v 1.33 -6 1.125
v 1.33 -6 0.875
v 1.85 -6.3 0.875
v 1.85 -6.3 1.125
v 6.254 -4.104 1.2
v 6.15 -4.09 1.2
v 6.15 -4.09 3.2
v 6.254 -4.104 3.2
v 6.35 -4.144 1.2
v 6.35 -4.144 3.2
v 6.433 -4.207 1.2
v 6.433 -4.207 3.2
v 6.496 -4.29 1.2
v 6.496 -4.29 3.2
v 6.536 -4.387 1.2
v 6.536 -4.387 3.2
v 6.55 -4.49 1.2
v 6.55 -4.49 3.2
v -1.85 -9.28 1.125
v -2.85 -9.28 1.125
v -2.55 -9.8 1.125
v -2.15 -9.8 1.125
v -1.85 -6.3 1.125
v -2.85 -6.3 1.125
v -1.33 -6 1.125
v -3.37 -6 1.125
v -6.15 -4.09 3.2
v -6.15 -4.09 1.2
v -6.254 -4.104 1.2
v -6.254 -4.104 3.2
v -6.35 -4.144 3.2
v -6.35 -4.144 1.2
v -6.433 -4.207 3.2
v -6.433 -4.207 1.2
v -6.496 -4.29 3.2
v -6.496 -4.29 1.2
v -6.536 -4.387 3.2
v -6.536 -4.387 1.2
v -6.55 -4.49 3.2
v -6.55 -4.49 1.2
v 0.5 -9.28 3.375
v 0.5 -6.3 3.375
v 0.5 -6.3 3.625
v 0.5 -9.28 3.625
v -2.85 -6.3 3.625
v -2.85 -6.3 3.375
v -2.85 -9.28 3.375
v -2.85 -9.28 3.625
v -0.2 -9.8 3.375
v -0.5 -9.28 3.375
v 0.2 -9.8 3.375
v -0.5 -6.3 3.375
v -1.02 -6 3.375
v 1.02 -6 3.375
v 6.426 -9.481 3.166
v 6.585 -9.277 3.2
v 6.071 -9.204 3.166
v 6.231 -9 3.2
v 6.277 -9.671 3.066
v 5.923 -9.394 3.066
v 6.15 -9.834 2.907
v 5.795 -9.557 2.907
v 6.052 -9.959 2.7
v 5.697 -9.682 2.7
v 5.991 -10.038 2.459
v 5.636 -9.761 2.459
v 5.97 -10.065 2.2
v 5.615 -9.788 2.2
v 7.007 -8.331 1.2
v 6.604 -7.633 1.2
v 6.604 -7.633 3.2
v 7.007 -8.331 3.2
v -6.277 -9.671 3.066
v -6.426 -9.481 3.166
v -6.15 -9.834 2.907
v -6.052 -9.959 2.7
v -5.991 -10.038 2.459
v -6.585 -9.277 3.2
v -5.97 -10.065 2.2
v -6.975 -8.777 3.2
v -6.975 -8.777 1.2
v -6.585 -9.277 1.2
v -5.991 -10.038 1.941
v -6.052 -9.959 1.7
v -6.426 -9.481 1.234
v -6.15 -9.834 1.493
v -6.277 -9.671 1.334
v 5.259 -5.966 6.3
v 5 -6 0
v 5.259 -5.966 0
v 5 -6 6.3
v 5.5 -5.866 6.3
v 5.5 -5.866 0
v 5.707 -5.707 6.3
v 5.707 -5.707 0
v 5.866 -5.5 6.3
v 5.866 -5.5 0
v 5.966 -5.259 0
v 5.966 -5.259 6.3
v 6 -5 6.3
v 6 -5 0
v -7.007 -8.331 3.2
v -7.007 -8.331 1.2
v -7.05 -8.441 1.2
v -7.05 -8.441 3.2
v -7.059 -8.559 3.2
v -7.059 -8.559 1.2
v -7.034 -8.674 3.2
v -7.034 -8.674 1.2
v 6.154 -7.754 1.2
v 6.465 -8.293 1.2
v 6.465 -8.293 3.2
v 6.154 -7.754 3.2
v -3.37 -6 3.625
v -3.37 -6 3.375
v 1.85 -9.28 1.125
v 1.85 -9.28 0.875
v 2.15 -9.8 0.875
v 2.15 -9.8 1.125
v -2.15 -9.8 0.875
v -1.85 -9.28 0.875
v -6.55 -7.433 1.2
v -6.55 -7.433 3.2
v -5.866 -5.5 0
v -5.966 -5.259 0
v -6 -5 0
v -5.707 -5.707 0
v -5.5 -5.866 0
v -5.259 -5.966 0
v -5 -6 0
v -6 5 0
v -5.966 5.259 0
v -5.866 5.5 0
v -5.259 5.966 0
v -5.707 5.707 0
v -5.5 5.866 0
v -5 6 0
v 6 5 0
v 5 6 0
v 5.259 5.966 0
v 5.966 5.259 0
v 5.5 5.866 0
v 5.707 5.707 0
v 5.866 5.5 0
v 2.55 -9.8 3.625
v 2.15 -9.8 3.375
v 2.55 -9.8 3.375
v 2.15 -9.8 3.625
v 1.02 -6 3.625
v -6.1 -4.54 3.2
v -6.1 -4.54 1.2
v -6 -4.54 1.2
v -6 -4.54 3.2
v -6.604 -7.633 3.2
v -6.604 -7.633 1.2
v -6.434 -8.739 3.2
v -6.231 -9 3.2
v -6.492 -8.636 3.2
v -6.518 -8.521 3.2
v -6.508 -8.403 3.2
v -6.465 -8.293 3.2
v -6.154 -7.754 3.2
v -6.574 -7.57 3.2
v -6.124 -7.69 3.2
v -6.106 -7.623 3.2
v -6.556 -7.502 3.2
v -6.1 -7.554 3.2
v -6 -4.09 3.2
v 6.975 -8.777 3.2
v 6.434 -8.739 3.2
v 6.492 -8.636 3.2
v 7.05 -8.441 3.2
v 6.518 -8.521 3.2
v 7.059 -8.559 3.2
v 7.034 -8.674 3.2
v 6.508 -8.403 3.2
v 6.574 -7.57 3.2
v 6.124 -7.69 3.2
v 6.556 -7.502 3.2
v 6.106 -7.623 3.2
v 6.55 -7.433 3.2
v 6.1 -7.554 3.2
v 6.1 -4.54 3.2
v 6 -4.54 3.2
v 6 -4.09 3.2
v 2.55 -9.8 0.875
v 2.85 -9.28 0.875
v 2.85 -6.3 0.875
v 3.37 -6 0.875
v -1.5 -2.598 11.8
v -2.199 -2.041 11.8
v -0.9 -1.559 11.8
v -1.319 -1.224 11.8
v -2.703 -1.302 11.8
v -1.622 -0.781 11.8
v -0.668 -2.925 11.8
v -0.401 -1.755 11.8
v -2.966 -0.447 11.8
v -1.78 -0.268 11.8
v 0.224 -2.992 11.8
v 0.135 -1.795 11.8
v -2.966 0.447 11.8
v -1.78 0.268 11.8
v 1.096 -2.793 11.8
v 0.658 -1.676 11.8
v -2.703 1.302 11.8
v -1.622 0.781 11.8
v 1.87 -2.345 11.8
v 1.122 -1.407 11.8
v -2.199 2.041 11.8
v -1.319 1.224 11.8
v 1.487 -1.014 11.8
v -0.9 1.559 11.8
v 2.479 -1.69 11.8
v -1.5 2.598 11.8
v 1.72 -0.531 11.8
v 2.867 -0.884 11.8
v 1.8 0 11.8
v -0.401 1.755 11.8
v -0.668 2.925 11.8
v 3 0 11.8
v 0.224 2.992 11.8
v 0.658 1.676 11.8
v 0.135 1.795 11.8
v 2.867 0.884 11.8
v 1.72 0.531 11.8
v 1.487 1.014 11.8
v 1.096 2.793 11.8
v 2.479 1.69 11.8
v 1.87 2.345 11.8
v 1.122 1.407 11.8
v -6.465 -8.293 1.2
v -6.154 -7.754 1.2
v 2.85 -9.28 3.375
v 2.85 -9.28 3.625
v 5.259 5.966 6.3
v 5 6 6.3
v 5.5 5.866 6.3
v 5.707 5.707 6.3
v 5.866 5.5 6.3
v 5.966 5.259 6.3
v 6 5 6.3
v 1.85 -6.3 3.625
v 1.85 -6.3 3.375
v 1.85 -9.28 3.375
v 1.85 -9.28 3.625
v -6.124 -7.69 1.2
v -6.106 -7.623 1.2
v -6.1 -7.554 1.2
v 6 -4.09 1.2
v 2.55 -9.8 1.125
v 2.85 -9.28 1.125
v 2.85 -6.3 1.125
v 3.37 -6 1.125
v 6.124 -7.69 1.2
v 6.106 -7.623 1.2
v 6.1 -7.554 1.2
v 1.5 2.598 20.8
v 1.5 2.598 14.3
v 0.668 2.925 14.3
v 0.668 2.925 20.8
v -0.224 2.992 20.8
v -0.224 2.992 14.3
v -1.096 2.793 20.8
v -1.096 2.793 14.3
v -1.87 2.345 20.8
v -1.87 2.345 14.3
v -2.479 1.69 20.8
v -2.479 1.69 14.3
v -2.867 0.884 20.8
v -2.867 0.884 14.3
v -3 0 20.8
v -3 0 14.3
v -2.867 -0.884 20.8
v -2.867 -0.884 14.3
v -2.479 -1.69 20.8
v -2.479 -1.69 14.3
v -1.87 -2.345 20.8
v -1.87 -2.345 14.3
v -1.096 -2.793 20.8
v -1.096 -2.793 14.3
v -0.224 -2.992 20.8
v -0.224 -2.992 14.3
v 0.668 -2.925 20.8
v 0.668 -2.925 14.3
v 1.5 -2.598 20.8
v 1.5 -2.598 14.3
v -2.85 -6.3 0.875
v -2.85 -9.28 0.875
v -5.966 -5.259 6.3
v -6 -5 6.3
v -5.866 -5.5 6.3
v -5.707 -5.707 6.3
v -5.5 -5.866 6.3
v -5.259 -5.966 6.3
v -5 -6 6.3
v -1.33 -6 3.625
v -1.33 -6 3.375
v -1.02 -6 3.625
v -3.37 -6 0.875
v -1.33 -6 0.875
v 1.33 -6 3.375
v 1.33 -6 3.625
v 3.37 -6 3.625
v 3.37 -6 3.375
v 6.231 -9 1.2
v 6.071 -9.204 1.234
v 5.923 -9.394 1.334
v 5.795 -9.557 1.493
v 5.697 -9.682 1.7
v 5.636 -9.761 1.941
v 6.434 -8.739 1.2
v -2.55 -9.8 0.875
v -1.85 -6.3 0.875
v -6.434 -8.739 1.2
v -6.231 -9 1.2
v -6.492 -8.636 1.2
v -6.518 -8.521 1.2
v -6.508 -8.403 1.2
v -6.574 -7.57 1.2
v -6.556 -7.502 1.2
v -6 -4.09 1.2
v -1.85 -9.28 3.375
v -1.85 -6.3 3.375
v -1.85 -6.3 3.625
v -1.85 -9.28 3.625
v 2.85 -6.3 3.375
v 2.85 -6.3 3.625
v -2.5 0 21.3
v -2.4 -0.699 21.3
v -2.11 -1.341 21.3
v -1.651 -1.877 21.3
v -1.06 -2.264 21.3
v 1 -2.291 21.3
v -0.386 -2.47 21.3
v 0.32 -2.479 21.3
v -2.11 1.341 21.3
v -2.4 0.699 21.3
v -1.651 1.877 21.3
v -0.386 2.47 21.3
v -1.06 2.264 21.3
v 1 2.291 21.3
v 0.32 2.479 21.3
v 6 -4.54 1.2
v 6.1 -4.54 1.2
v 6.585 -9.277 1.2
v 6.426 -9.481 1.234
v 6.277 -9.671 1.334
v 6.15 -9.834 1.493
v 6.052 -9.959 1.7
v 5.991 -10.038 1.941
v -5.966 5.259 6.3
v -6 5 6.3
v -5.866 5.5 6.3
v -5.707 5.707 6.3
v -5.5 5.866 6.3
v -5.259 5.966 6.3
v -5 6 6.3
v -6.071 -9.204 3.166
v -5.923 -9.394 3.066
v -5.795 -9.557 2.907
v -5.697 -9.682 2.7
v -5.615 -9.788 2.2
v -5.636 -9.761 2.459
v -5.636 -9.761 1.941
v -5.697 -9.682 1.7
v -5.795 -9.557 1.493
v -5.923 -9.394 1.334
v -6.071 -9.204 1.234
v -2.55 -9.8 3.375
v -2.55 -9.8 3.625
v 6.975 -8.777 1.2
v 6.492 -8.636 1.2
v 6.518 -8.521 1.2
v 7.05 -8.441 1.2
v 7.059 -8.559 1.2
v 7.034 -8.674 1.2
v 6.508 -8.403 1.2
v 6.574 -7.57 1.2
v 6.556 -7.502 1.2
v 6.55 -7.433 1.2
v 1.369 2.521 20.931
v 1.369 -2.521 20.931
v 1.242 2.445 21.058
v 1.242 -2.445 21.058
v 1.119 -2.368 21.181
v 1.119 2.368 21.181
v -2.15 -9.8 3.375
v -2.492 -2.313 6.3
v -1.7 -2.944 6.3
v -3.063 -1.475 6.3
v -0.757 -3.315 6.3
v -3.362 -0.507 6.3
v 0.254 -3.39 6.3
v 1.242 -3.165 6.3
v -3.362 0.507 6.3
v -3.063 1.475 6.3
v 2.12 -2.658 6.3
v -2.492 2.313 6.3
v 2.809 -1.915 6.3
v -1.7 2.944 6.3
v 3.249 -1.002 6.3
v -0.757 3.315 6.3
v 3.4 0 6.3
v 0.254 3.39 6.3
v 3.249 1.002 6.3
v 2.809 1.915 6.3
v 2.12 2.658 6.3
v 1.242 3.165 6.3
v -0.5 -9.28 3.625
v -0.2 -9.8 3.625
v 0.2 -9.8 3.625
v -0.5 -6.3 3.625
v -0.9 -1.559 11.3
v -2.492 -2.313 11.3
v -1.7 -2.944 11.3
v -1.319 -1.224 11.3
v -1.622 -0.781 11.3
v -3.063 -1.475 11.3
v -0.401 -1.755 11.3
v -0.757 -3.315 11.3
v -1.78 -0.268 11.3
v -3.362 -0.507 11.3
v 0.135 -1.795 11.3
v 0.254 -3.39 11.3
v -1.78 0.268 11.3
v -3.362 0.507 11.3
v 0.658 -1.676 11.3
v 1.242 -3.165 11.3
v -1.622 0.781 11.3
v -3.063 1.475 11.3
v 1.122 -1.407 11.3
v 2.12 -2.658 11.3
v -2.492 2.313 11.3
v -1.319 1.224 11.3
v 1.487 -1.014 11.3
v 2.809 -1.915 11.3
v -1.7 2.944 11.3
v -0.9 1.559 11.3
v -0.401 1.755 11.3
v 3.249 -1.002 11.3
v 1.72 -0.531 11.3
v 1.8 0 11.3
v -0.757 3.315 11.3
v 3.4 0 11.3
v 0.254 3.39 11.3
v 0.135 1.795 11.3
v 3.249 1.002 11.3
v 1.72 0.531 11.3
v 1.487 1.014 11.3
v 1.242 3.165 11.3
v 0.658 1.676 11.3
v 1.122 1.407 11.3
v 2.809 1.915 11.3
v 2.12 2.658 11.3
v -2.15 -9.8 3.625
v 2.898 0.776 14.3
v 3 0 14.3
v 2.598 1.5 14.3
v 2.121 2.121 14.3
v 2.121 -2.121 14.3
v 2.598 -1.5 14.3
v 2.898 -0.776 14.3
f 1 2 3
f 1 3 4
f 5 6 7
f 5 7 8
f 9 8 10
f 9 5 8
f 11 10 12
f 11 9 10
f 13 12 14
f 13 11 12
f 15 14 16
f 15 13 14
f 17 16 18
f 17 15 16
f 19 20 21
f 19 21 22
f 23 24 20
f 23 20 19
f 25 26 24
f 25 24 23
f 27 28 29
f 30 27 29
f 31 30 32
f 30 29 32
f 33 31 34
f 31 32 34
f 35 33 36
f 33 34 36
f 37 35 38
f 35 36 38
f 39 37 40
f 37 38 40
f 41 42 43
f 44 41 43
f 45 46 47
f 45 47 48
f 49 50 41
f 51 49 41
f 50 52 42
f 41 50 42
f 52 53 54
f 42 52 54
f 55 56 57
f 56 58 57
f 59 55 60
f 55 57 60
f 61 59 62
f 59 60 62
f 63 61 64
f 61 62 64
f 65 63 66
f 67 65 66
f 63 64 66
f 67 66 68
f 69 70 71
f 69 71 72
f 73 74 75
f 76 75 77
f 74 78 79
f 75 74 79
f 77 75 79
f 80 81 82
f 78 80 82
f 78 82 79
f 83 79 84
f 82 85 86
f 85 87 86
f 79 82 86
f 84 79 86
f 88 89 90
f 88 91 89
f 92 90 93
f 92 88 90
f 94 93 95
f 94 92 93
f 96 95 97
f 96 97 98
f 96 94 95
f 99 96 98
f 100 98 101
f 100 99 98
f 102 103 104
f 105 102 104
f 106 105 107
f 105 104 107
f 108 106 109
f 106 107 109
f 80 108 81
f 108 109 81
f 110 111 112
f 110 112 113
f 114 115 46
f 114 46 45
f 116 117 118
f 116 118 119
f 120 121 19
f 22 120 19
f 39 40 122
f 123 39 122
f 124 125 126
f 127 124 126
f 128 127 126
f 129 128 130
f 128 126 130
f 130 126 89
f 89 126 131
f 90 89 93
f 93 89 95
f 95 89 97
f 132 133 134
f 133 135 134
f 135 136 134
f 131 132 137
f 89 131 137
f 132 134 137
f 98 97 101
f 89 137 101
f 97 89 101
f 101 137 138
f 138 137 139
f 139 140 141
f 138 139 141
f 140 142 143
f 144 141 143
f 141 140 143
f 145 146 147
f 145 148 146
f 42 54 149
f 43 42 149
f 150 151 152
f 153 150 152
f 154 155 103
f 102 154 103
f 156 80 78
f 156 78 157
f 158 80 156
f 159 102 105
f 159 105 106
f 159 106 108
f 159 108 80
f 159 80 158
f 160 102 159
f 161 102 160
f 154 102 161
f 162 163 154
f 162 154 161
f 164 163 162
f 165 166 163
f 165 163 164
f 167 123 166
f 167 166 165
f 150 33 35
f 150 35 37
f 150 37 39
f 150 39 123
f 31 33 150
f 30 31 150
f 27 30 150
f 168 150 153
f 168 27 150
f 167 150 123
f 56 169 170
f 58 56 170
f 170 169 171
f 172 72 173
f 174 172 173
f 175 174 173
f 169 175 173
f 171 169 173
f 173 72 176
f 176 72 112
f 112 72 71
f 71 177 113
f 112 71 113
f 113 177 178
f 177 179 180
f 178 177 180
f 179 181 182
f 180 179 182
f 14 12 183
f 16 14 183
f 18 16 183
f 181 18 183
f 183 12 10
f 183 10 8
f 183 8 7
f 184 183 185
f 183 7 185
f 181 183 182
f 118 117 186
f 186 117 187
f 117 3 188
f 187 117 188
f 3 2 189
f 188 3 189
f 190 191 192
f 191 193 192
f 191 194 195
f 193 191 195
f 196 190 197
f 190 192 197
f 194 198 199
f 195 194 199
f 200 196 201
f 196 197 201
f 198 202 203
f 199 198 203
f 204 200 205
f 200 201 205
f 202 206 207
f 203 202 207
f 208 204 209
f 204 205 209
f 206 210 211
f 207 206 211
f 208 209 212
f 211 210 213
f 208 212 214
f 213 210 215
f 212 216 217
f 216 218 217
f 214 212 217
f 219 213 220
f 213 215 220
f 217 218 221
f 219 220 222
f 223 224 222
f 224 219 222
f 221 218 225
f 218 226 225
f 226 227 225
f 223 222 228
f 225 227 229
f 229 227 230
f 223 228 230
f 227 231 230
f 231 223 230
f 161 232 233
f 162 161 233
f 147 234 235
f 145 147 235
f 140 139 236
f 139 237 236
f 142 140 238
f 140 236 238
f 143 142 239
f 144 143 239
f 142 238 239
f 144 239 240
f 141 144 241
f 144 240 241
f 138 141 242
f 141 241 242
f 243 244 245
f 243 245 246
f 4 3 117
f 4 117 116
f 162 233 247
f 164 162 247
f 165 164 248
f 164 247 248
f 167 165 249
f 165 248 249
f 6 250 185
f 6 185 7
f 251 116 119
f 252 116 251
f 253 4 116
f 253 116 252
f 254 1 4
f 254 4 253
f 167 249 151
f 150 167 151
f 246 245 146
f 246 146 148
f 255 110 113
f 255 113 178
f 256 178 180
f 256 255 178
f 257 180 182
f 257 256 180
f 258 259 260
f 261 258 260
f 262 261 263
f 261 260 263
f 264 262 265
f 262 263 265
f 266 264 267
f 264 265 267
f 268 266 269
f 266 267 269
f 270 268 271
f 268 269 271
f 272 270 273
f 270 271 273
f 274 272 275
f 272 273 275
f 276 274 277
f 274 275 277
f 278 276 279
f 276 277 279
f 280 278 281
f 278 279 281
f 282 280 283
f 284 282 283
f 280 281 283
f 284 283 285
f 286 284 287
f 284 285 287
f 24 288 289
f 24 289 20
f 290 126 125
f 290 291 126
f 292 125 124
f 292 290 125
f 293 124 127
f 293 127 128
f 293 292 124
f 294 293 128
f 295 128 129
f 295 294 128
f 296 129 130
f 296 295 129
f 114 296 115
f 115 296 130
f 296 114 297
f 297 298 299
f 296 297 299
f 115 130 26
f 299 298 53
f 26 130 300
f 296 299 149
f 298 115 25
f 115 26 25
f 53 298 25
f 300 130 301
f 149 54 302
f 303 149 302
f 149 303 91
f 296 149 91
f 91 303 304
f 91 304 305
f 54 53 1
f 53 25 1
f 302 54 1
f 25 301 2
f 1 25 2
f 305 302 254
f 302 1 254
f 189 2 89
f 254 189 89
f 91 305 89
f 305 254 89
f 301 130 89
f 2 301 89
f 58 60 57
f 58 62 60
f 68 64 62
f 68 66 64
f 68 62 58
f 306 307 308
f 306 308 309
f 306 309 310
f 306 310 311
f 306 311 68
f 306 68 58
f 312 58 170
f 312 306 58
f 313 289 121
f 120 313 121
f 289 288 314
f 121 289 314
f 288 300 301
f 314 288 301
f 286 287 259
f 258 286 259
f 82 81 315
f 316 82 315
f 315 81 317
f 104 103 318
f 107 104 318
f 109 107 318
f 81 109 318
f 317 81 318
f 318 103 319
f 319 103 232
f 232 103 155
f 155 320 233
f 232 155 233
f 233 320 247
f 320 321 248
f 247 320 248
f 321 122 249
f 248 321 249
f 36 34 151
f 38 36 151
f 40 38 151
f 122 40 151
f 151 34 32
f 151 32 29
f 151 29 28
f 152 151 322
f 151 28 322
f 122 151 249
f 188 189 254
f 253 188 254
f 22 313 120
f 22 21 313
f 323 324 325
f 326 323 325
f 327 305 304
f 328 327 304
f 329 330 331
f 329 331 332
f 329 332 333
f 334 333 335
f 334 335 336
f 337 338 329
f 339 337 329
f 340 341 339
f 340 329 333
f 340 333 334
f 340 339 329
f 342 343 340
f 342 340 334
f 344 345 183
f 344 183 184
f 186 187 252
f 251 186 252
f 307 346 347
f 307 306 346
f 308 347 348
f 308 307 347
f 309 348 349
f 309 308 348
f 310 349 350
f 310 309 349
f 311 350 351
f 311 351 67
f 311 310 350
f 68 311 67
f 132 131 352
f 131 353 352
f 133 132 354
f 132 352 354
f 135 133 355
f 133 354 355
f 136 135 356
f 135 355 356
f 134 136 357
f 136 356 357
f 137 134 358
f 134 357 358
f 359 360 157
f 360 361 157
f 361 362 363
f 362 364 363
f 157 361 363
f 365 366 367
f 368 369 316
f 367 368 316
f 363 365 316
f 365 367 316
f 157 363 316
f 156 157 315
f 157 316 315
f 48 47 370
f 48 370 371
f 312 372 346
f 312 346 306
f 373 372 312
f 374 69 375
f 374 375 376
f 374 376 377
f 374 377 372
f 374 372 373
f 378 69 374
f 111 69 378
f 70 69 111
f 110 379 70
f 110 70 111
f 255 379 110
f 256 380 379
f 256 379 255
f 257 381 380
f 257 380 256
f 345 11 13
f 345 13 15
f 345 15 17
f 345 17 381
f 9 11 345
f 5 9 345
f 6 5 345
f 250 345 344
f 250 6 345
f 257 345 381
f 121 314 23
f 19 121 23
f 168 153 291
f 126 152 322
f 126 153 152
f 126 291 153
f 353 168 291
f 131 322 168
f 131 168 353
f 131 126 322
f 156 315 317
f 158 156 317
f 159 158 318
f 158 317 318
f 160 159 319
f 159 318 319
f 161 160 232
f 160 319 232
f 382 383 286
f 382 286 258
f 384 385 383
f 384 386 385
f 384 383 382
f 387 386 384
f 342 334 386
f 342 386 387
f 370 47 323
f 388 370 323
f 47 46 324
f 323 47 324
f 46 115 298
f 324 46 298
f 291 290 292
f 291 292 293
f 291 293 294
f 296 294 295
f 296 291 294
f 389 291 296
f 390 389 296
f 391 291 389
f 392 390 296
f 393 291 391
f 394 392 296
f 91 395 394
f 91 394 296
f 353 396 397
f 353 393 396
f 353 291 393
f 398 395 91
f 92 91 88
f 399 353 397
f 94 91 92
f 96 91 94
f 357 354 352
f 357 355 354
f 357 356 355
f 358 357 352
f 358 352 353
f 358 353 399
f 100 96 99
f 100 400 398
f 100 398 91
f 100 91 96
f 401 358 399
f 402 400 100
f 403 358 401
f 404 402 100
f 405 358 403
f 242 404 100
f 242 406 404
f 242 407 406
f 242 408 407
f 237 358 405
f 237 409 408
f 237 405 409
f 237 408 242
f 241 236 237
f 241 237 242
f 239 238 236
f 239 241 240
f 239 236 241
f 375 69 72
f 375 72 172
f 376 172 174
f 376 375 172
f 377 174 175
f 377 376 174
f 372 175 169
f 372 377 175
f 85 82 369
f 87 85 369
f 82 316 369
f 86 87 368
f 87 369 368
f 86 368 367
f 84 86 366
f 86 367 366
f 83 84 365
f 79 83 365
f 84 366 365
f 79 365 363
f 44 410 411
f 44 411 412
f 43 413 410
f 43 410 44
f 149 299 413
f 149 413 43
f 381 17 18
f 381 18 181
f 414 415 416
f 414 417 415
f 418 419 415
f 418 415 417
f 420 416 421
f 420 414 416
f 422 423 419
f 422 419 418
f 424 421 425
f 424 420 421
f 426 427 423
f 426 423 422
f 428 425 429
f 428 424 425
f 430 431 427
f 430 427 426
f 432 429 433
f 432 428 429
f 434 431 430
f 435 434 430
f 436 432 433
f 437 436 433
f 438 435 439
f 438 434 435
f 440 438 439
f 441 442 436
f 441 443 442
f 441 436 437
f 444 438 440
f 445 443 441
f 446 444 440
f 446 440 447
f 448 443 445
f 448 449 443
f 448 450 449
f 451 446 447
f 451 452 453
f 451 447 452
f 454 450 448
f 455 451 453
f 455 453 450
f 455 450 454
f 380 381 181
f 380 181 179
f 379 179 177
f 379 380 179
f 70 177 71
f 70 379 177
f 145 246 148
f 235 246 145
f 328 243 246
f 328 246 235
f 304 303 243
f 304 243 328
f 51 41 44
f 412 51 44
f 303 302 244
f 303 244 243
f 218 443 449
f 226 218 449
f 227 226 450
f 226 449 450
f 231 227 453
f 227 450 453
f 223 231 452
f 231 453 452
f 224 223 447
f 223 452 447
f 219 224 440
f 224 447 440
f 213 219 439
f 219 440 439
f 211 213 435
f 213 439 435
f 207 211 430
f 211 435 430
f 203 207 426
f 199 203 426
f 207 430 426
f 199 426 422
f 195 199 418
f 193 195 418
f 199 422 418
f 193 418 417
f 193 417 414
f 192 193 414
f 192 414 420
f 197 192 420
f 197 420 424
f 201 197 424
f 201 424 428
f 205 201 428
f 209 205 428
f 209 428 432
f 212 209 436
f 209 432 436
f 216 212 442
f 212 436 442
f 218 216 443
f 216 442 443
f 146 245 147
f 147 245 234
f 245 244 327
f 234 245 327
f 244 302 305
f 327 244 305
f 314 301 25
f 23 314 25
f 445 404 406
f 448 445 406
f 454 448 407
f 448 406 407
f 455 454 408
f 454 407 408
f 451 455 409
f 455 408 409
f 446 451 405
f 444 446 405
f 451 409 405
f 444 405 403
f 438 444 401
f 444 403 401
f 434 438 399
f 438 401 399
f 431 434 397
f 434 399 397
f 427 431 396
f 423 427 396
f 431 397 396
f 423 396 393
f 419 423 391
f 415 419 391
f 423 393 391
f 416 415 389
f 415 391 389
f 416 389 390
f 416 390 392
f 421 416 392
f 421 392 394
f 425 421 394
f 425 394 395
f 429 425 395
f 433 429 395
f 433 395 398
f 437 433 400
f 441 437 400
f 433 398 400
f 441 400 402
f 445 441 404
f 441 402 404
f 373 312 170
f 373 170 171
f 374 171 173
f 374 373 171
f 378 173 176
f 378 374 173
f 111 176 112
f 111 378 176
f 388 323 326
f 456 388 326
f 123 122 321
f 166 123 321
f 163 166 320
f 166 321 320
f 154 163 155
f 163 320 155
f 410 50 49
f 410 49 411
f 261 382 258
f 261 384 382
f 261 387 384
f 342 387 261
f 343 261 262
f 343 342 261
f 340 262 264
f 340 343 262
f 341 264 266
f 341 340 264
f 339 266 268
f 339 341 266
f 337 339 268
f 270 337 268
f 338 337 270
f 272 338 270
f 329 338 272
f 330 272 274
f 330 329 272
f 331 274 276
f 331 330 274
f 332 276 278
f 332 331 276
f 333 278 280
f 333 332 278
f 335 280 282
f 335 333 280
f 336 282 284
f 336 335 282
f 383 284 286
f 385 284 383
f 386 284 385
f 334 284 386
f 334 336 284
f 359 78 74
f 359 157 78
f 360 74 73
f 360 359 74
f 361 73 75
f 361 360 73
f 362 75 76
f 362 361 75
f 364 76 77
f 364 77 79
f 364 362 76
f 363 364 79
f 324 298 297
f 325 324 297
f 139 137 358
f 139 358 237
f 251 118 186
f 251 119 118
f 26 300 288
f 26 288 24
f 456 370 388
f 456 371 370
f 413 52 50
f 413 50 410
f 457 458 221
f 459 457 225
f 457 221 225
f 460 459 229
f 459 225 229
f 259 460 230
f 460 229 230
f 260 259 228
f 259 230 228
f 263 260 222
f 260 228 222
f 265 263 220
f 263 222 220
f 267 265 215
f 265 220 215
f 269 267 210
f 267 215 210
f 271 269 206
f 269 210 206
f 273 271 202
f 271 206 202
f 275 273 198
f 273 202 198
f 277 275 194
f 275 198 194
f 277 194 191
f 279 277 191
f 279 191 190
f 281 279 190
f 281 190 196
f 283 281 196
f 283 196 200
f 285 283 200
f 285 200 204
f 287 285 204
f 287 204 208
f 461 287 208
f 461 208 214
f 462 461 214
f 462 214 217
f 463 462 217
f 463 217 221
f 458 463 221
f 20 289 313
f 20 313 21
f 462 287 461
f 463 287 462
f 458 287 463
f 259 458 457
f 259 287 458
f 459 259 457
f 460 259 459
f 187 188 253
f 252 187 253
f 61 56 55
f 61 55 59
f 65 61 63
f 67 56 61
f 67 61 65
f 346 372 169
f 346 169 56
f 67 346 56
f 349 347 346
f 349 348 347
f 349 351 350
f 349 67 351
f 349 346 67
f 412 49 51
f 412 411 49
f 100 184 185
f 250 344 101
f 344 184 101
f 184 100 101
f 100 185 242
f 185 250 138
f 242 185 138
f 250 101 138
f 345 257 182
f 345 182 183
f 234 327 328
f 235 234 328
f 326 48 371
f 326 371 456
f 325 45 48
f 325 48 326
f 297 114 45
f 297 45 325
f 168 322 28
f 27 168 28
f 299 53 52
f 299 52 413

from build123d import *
from OCP.BRepFilletAPI import BRepFilletAPI_MakeChamfer

# Parameters (mm, degrees)
ESQUISSE1_W           = 12
ESQUISSE1_H           = 12
BOSS_EXTRU_1_DEPTH    = 6.3
ESQUISSE2_R           = 3.4
BOSS_EXTRU_2_DEPTH    = 5
ESQUISSE5_R           = 1.8
BOSS_EXTRU_5_DEPTH    = 0.5
ESQUISSE3_R           = 3
BOSS_EXTRU_3_DEPTH    = 2.5
BOSS_EXTRU_6_START    = 2.5
BOSS_EXTRU_6_DEPTH    = 7
ESQUISSE4_W           = 1
ESQUISSE4_H           = 0.25
BOSS_EXTRU_4_DEPTH    = 3.8
CHANFREIN1_SIZE       = 0.5
CONG_1_R              = 1
CHANFREIN2_SIZE       = 0.3
CHANFREIN2_SIZE2      = 0.519615242
BOSS_EXTRU_7_START    = -1.2
BOSS_EXTRU_7_DEPTH    = 2
CONG_2_R              = 1
CONG_2_OF_SYM_TRIE1_R = 1


with BuildPart() as part:
    # Esquisse1 → Boss.-Extru.1 (new body)
    with BuildSketch(Plane.XY):
        Rectangle(ESQUISSE1_W, ESQUISSE1_H)
    extrude(amount=BOSS_EXTRU_1_DEPTH)

    # Esquisse2 → Boss.-Extru.2 (add)
    with BuildSketch(Plane.XY.offset(6.3)):
        Circle(ESQUISSE2_R)
    extrude(amount=BOSS_EXTRU_2_DEPTH)

    # Esquisse5 → Boss.-Extru.5 (add)
    with BuildSketch(Plane.XY.offset(11.3)):
        Circle(ESQUISSE5_R)
    extrude(amount=BOSS_EXTRU_5_DEPTH)

    # Esquisse3 → Boss.-Extru.3 (add)
    with BuildSketch(Plane.XY.offset(11.8)):
        Circle(ESQUISSE3_R)
    extrude(amount=BOSS_EXTRU_3_DEPTH)

    # Esquisse3<4> → Boss.-Extru.6 (add)
    with BuildSketch(Plane.XY.offset(11.8).offset(BOSS_EXTRU_6_START)):
        with BuildLine():
            Line((1.5, 0.994987437), (1.5, 2.598076211))
            ThreePointArc((1.5, 2.598076211), (-3, 0), (1.5, -2.598076211))
            Line((1.5, -2.598076211), (1.5, -0.994987437))
            ThreePointArc((1.5, -0.994987437), (-1.8, 0), (1.5, 0.994987437))
        make_face()
        with BuildLine():
            Line((1.5, -0.994987437), (1.5, 0.994987437))
            ThreePointArc((1.5, 0.994987437), (-1.8, 0), (1.5, -0.994987437))
        make_face()
    extrude(amount=BOSS_EXTRU_6_DEPTH)

    # Esquisse4 → Boss.-Extru.4 (add)
    with BuildSketch(Plane.XZ.offset(6)):
        with Locations((0, 3.5)):
            Rectangle(ESQUISSE4_W, ESQUISSE4_H)
        with Locations((2.35, 3.5)):
            Rectangle(ESQUISSE4_W, ESQUISSE4_H)
        with Locations((-2.35, 3.5)):
            Rectangle(ESQUISSE4_W, ESQUISSE4_H)
        with Locations((-2.35, 1)):
            Rectangle(ESQUISSE4_W, ESQUISSE4_H)
        with Locations((2.35, 1)):
            Rectangle(ESQUISSE4_W, ESQUISSE4_H)
    extrude(amount=BOSS_EXTRU_4_DEPTH)

    # Chanfrein1
    chanfrein1_edges = [part.edges().sort_by_distance(p)[0] for p in [
        (1.5, 0, 21.3),
        (-3, 0, 21.3),
    ]]
    chamfer(chanfrein1_edges, length=CHANFREIN1_SIZE)

    # Congé1
    cong_1_edges = [part.edges().sort_by_distance(p)[0] for p in [
        (6, -6, 3.15),
        (-6, -6, 3.15),
        (-6, 6, 3.15),
        (6, 6, 3.15),
    ]]
    fillet(cong_1_edges, radius=CONG_1_R)

    # Chanfrein2: one chamfer whose edges measure the first distance from different faces: ONE call of the kernel's chamfer builder (chamfer() names one face for all edges)
    chanfrein2_edges_1 = [part.edges().sort_by_distance(p)[0] for p in [
        (0.5, -6, 3.5),
    ]]
    chanfrein2_side_1 = [part.faces().sort_by_distance(p)[0] for p in [
        (0.5, -7.9, 3.5),
    ]]
    chanfrein2_edges_2 = [part.edges().sort_by_distance(p)[0] for p in [
        (-0.5, -6, 3.5),
    ]]
    chanfrein2_side_2 = [part.faces().sort_by_distance(p)[0] for p in [
        (-0.5, -7.9, 3.5),
    ]]
    chanfrein2_edges_3 = [part.edges().sort_by_distance(p)[0] for p in [
        (0.5, -9.8, 3.5),
        (-0.5, -9.8, 3.5),
    ]]
    chanfrein2_side_3 = [part.faces().sort_by_distance(p)[0] for p in [
        (0, -9.8, 3.5),
    ]]
    chanfrein2_edges_4 = [part.edges().sort_by_distance(p)[0] for p in [
        (2.85, -6, 3.5),
    ]]
    chanfrein2_side_4 = [part.faces().sort_by_distance(p)[0] for p in [
        (2.85, -7.9, 3.5),
    ]]
    chanfrein2_edges_5 = [part.edges().sort_by_distance(p)[0] for p in [
        (1.85, -6, 3.5),
    ]]
    chanfrein2_side_5 = [part.faces().sort_by_distance(p)[0] for p in [
        (1.85, -7.9, 3.5),
    ]]
    chanfrein2_edges_6 = [part.edges().sort_by_distance(p)[0] for p in [
        (2.85, -9.8, 3.5),
        (1.85, -9.8, 3.5),
    ]]
    chanfrein2_side_6 = [part.faces().sort_by_distance(p)[0] for p in [
        (2.35, -9.8, 3.5),
    ]]
    chanfrein2_edges_7 = [part.edges().sort_by_distance(p)[0] for p in [
        (-1.85, -6, 3.5),
    ]]
    chanfrein2_side_7 = [part.faces().sort_by_distance(p)[0] for p in [
        (-1.85, -7.9, 3.5),
    ]]
    chanfrein2_edges_8 = [part.edges().sort_by_distance(p)[0] for p in [
        (-2.85, -6, 3.5),
    ]]
    chanfrein2_side_8 = [part.faces().sort_by_distance(p)[0] for p in [
        (-2.85, -7.9, 3.5),
    ]]
    chanfrein2_edges_9 = [part.edges().sort_by_distance(p)[0] for p in [
        (-1.85, -9.8, 3.5),
        (-2.85, -9.8, 3.5),
    ]]
    chanfrein2_side_9 = [part.faces().sort_by_distance(p)[0] for p in [
        (-2.35, -9.8, 3.5),
    ]]
    chanfrein2_edges_10 = [part.edges().sort_by_distance(p)[0] for p in [
        (-1.85, -6, 1),
    ]]
    chanfrein2_side_10 = [part.faces().sort_by_distance(p)[0] for p in [
        (-1.85, -7.9, 1),
    ]]
    chanfrein2_edges_11 = [part.edges().sort_by_distance(p)[0] for p in [
        (-2.85, -6, 1),
    ]]
    chanfrein2_side_11 = [part.faces().sort_by_distance(p)[0] for p in [
        (-2.85, -7.9, 1),
    ]]
    chanfrein2_edges_12 = [part.edges().sort_by_distance(p)[0] for p in [
        (-1.85, -9.8, 1),
        (-2.85, -9.8, 1),
    ]]
    chanfrein2_side_12 = [part.faces().sort_by_distance(p)[0] for p in [
        (-2.35, -9.8, 1),
    ]]
    chanfrein2_edges_13 = [part.edges().sort_by_distance(p)[0] for p in [
        (2.85, -6, 1),
    ]]
    chanfrein2_side_13 = [part.faces().sort_by_distance(p)[0] for p in [
        (2.85, -7.9, 1),
    ]]
    chanfrein2_edges_14 = [part.edges().sort_by_distance(p)[0] for p in [
        (1.85, -6, 1),
    ]]
    chanfrein2_side_14 = [part.faces().sort_by_distance(p)[0] for p in [
        (1.85, -7.9, 1),
    ]]
    chanfrein2_edges_15 = [part.edges().sort_by_distance(p)[0] for p in [
        (2.85, -9.8, 1),
        (1.85, -9.8, 1),
    ]]
    chanfrein2_side_15 = [part.faces().sort_by_distance(p)[0] for p in [
        (2.35, -9.8, 1),
    ]]
    chanfrein2 = BRepFilletAPI_MakeChamfer(part.part.solid().wrapped)
    for e in chanfrein2_edges_1:
        chanfrein2.Add(CHANFREIN2_SIZE, CHANFREIN2_SIZE2, e.wrapped, chanfrein2_side_1[0].wrapped)  # the first distance lies on this face
    for e in chanfrein2_edges_2:
        chanfrein2.Add(CHANFREIN2_SIZE, CHANFREIN2_SIZE2, e.wrapped, chanfrein2_side_2[0].wrapped)  # the first distance lies on this face
    for e in chanfrein2_edges_3:
        chanfrein2.Add(CHANFREIN2_SIZE, CHANFREIN2_SIZE2, e.wrapped, chanfrein2_side_3[0].wrapped)  # the first distance lies on this face
    for e in chanfrein2_edges_4:
        chanfrein2.Add(CHANFREIN2_SIZE, CHANFREIN2_SIZE2, e.wrapped, chanfrein2_side_4[0].wrapped)  # the first distance lies on this face
    for e in chanfrein2_edges_5:
        chanfrein2.Add(CHANFREIN2_SIZE, CHANFREIN2_SIZE2, e.wrapped, chanfrein2_side_5[0].wrapped)  # the first distance lies on this face
    for e in chanfrein2_edges_6:
        chanfrein2.Add(CHANFREIN2_SIZE, CHANFREIN2_SIZE2, e.wrapped, chanfrein2_side_6[0].wrapped)  # the first distance lies on this face
    for e in chanfrein2_edges_7:
        chanfrein2.Add(CHANFREIN2_SIZE, CHANFREIN2_SIZE2, e.wrapped, chanfrein2_side_7[0].wrapped)  # the first distance lies on this face
    for e in chanfrein2_edges_8:
        chanfrein2.Add(CHANFREIN2_SIZE, CHANFREIN2_SIZE2, e.wrapped, chanfrein2_side_8[0].wrapped)  # the first distance lies on this face
    for e in chanfrein2_edges_9:
        chanfrein2.Add(CHANFREIN2_SIZE, CHANFREIN2_SIZE2, e.wrapped, chanfrein2_side_9[0].wrapped)  # the first distance lies on this face
    for e in chanfrein2_edges_10:
        chanfrein2.Add(CHANFREIN2_SIZE, CHANFREIN2_SIZE2, e.wrapped, chanfrein2_side_10[0].wrapped)  # the first distance lies on this face
    for e in chanfrein2_edges_11:
        chanfrein2.Add(CHANFREIN2_SIZE, CHANFREIN2_SIZE2, e.wrapped, chanfrein2_side_11[0].wrapped)  # the first distance lies on this face
    for e in chanfrein2_edges_12:
        chanfrein2.Add(CHANFREIN2_SIZE, CHANFREIN2_SIZE2, e.wrapped, chanfrein2_side_12[0].wrapped)  # the first distance lies on this face
    for e in chanfrein2_edges_13:
        chanfrein2.Add(CHANFREIN2_SIZE, CHANFREIN2_SIZE2, e.wrapped, chanfrein2_side_13[0].wrapped)  # the first distance lies on this face
    for e in chanfrein2_edges_14:
        chanfrein2.Add(CHANFREIN2_SIZE, CHANFREIN2_SIZE2, e.wrapped, chanfrein2_side_14[0].wrapped)  # the first distance lies on this face
    for e in chanfrein2_edges_15:
        chanfrein2.Add(CHANFREIN2_SIZE, CHANFREIN2_SIZE2, e.wrapped, chanfrein2_side_15[0].wrapped)  # the first distance lies on this face
    add(Compound.cast(chanfrein2.Shape()), mode=Mode.REPLACE)

    # Esquisse6 → Boss.-Extru.7 (add)
    with BuildSketch(Plane(origin=(0, 0, 0), x_dir=(-1, 0, 0), z_dir=(0, 0, -1)).offset(BOSS_EXTRU_7_START)):
        with BuildLine():
            Line((-6, -4.090148625), (-6.15, -4.090148625))
            ThreePointArc((-6.15, -4.090148625), (-6.432842712, -4.207305912), (-6.55, -4.490148625))
            Line((-6.55, -4.490148625), (-6.55, -7.432968948))
            ThreePointArc((-6.55, -7.432968948), (-6.563629669, -7.536496566), (-6.603589838, -7.632968948))
            Line((-6.603589838, -7.632968948), (-7.006574145, -8.330958241))
            ThreePointArc((-7.006574145, -8.330958241), (-7.059189603, -8.55886083), (-6.975368285, -8.777222831))
            Line((-6.975368285, -8.777222831), (-5.969546479, -10.064616035))
            Line((-5.969546479, -10.064616035), (-5.614941639, -9.787568371))
            Line((-5.614941639, -9.787568371), (-6.433892437, -8.739359151))
            ThreePointArc((-6.433892437, -8.739359151), (-6.517713755, -8.52099715), (-6.465098297, -8.293094561))
            Line((-6.465098297, -8.293094561), (-6.153589838, -7.753546084))
            ThreePointArc((-6.153589838, -7.753546084), (-6.113629669, -7.657073702), (-6.1, -7.553546084))
            Line((-6.1, -7.553546084), (-6.1, -4.540148625))
            Line((-6.1, -4.540148625), (-6, -4.540148625))
            Line((-6, -4.540148625), (-6, -4.090148625))
        make_face()
    boss_extru_7 = extrude(amount=-BOSS_EXTRU_7_DEPTH)

    # Congé2
    cong_2_edges = [part.edges().sort_by_distance(p)[0] for p in [
        (5.792244059, -9.926092203, 1.2),
        (5.792244059, -9.926092203, 3.2),
    ]]
    fillet(cong_2_edges, radius=CONG_2_R - 0.0001)  # a hair under: the kernel refuses the full size

    # Symétrie1: Boss.-Extru.7 across plane
    add(boss_extru_7.mirror(Plane(origin=(0, 0, 0), x_dir=(0, 0, 1), z_dir=(1, 0, 0))))

    # Congé2 of Symétrie1
    cong_2_of_sym_trie1_edges = [part.edges().sort_by_distance(p)[0] for p in [
        (-5.792244059, -9.926092203, 1.2),
        (-5.792244059, -9.926092203, 3.2),
    ]]
    fillet(cong_2_of_sym_trie1_edges, radius=CONG_2_OF_SYM_TRIE1_R - 0.0001)  # a hair under: the kernel refuses the full size


solid = part.part
